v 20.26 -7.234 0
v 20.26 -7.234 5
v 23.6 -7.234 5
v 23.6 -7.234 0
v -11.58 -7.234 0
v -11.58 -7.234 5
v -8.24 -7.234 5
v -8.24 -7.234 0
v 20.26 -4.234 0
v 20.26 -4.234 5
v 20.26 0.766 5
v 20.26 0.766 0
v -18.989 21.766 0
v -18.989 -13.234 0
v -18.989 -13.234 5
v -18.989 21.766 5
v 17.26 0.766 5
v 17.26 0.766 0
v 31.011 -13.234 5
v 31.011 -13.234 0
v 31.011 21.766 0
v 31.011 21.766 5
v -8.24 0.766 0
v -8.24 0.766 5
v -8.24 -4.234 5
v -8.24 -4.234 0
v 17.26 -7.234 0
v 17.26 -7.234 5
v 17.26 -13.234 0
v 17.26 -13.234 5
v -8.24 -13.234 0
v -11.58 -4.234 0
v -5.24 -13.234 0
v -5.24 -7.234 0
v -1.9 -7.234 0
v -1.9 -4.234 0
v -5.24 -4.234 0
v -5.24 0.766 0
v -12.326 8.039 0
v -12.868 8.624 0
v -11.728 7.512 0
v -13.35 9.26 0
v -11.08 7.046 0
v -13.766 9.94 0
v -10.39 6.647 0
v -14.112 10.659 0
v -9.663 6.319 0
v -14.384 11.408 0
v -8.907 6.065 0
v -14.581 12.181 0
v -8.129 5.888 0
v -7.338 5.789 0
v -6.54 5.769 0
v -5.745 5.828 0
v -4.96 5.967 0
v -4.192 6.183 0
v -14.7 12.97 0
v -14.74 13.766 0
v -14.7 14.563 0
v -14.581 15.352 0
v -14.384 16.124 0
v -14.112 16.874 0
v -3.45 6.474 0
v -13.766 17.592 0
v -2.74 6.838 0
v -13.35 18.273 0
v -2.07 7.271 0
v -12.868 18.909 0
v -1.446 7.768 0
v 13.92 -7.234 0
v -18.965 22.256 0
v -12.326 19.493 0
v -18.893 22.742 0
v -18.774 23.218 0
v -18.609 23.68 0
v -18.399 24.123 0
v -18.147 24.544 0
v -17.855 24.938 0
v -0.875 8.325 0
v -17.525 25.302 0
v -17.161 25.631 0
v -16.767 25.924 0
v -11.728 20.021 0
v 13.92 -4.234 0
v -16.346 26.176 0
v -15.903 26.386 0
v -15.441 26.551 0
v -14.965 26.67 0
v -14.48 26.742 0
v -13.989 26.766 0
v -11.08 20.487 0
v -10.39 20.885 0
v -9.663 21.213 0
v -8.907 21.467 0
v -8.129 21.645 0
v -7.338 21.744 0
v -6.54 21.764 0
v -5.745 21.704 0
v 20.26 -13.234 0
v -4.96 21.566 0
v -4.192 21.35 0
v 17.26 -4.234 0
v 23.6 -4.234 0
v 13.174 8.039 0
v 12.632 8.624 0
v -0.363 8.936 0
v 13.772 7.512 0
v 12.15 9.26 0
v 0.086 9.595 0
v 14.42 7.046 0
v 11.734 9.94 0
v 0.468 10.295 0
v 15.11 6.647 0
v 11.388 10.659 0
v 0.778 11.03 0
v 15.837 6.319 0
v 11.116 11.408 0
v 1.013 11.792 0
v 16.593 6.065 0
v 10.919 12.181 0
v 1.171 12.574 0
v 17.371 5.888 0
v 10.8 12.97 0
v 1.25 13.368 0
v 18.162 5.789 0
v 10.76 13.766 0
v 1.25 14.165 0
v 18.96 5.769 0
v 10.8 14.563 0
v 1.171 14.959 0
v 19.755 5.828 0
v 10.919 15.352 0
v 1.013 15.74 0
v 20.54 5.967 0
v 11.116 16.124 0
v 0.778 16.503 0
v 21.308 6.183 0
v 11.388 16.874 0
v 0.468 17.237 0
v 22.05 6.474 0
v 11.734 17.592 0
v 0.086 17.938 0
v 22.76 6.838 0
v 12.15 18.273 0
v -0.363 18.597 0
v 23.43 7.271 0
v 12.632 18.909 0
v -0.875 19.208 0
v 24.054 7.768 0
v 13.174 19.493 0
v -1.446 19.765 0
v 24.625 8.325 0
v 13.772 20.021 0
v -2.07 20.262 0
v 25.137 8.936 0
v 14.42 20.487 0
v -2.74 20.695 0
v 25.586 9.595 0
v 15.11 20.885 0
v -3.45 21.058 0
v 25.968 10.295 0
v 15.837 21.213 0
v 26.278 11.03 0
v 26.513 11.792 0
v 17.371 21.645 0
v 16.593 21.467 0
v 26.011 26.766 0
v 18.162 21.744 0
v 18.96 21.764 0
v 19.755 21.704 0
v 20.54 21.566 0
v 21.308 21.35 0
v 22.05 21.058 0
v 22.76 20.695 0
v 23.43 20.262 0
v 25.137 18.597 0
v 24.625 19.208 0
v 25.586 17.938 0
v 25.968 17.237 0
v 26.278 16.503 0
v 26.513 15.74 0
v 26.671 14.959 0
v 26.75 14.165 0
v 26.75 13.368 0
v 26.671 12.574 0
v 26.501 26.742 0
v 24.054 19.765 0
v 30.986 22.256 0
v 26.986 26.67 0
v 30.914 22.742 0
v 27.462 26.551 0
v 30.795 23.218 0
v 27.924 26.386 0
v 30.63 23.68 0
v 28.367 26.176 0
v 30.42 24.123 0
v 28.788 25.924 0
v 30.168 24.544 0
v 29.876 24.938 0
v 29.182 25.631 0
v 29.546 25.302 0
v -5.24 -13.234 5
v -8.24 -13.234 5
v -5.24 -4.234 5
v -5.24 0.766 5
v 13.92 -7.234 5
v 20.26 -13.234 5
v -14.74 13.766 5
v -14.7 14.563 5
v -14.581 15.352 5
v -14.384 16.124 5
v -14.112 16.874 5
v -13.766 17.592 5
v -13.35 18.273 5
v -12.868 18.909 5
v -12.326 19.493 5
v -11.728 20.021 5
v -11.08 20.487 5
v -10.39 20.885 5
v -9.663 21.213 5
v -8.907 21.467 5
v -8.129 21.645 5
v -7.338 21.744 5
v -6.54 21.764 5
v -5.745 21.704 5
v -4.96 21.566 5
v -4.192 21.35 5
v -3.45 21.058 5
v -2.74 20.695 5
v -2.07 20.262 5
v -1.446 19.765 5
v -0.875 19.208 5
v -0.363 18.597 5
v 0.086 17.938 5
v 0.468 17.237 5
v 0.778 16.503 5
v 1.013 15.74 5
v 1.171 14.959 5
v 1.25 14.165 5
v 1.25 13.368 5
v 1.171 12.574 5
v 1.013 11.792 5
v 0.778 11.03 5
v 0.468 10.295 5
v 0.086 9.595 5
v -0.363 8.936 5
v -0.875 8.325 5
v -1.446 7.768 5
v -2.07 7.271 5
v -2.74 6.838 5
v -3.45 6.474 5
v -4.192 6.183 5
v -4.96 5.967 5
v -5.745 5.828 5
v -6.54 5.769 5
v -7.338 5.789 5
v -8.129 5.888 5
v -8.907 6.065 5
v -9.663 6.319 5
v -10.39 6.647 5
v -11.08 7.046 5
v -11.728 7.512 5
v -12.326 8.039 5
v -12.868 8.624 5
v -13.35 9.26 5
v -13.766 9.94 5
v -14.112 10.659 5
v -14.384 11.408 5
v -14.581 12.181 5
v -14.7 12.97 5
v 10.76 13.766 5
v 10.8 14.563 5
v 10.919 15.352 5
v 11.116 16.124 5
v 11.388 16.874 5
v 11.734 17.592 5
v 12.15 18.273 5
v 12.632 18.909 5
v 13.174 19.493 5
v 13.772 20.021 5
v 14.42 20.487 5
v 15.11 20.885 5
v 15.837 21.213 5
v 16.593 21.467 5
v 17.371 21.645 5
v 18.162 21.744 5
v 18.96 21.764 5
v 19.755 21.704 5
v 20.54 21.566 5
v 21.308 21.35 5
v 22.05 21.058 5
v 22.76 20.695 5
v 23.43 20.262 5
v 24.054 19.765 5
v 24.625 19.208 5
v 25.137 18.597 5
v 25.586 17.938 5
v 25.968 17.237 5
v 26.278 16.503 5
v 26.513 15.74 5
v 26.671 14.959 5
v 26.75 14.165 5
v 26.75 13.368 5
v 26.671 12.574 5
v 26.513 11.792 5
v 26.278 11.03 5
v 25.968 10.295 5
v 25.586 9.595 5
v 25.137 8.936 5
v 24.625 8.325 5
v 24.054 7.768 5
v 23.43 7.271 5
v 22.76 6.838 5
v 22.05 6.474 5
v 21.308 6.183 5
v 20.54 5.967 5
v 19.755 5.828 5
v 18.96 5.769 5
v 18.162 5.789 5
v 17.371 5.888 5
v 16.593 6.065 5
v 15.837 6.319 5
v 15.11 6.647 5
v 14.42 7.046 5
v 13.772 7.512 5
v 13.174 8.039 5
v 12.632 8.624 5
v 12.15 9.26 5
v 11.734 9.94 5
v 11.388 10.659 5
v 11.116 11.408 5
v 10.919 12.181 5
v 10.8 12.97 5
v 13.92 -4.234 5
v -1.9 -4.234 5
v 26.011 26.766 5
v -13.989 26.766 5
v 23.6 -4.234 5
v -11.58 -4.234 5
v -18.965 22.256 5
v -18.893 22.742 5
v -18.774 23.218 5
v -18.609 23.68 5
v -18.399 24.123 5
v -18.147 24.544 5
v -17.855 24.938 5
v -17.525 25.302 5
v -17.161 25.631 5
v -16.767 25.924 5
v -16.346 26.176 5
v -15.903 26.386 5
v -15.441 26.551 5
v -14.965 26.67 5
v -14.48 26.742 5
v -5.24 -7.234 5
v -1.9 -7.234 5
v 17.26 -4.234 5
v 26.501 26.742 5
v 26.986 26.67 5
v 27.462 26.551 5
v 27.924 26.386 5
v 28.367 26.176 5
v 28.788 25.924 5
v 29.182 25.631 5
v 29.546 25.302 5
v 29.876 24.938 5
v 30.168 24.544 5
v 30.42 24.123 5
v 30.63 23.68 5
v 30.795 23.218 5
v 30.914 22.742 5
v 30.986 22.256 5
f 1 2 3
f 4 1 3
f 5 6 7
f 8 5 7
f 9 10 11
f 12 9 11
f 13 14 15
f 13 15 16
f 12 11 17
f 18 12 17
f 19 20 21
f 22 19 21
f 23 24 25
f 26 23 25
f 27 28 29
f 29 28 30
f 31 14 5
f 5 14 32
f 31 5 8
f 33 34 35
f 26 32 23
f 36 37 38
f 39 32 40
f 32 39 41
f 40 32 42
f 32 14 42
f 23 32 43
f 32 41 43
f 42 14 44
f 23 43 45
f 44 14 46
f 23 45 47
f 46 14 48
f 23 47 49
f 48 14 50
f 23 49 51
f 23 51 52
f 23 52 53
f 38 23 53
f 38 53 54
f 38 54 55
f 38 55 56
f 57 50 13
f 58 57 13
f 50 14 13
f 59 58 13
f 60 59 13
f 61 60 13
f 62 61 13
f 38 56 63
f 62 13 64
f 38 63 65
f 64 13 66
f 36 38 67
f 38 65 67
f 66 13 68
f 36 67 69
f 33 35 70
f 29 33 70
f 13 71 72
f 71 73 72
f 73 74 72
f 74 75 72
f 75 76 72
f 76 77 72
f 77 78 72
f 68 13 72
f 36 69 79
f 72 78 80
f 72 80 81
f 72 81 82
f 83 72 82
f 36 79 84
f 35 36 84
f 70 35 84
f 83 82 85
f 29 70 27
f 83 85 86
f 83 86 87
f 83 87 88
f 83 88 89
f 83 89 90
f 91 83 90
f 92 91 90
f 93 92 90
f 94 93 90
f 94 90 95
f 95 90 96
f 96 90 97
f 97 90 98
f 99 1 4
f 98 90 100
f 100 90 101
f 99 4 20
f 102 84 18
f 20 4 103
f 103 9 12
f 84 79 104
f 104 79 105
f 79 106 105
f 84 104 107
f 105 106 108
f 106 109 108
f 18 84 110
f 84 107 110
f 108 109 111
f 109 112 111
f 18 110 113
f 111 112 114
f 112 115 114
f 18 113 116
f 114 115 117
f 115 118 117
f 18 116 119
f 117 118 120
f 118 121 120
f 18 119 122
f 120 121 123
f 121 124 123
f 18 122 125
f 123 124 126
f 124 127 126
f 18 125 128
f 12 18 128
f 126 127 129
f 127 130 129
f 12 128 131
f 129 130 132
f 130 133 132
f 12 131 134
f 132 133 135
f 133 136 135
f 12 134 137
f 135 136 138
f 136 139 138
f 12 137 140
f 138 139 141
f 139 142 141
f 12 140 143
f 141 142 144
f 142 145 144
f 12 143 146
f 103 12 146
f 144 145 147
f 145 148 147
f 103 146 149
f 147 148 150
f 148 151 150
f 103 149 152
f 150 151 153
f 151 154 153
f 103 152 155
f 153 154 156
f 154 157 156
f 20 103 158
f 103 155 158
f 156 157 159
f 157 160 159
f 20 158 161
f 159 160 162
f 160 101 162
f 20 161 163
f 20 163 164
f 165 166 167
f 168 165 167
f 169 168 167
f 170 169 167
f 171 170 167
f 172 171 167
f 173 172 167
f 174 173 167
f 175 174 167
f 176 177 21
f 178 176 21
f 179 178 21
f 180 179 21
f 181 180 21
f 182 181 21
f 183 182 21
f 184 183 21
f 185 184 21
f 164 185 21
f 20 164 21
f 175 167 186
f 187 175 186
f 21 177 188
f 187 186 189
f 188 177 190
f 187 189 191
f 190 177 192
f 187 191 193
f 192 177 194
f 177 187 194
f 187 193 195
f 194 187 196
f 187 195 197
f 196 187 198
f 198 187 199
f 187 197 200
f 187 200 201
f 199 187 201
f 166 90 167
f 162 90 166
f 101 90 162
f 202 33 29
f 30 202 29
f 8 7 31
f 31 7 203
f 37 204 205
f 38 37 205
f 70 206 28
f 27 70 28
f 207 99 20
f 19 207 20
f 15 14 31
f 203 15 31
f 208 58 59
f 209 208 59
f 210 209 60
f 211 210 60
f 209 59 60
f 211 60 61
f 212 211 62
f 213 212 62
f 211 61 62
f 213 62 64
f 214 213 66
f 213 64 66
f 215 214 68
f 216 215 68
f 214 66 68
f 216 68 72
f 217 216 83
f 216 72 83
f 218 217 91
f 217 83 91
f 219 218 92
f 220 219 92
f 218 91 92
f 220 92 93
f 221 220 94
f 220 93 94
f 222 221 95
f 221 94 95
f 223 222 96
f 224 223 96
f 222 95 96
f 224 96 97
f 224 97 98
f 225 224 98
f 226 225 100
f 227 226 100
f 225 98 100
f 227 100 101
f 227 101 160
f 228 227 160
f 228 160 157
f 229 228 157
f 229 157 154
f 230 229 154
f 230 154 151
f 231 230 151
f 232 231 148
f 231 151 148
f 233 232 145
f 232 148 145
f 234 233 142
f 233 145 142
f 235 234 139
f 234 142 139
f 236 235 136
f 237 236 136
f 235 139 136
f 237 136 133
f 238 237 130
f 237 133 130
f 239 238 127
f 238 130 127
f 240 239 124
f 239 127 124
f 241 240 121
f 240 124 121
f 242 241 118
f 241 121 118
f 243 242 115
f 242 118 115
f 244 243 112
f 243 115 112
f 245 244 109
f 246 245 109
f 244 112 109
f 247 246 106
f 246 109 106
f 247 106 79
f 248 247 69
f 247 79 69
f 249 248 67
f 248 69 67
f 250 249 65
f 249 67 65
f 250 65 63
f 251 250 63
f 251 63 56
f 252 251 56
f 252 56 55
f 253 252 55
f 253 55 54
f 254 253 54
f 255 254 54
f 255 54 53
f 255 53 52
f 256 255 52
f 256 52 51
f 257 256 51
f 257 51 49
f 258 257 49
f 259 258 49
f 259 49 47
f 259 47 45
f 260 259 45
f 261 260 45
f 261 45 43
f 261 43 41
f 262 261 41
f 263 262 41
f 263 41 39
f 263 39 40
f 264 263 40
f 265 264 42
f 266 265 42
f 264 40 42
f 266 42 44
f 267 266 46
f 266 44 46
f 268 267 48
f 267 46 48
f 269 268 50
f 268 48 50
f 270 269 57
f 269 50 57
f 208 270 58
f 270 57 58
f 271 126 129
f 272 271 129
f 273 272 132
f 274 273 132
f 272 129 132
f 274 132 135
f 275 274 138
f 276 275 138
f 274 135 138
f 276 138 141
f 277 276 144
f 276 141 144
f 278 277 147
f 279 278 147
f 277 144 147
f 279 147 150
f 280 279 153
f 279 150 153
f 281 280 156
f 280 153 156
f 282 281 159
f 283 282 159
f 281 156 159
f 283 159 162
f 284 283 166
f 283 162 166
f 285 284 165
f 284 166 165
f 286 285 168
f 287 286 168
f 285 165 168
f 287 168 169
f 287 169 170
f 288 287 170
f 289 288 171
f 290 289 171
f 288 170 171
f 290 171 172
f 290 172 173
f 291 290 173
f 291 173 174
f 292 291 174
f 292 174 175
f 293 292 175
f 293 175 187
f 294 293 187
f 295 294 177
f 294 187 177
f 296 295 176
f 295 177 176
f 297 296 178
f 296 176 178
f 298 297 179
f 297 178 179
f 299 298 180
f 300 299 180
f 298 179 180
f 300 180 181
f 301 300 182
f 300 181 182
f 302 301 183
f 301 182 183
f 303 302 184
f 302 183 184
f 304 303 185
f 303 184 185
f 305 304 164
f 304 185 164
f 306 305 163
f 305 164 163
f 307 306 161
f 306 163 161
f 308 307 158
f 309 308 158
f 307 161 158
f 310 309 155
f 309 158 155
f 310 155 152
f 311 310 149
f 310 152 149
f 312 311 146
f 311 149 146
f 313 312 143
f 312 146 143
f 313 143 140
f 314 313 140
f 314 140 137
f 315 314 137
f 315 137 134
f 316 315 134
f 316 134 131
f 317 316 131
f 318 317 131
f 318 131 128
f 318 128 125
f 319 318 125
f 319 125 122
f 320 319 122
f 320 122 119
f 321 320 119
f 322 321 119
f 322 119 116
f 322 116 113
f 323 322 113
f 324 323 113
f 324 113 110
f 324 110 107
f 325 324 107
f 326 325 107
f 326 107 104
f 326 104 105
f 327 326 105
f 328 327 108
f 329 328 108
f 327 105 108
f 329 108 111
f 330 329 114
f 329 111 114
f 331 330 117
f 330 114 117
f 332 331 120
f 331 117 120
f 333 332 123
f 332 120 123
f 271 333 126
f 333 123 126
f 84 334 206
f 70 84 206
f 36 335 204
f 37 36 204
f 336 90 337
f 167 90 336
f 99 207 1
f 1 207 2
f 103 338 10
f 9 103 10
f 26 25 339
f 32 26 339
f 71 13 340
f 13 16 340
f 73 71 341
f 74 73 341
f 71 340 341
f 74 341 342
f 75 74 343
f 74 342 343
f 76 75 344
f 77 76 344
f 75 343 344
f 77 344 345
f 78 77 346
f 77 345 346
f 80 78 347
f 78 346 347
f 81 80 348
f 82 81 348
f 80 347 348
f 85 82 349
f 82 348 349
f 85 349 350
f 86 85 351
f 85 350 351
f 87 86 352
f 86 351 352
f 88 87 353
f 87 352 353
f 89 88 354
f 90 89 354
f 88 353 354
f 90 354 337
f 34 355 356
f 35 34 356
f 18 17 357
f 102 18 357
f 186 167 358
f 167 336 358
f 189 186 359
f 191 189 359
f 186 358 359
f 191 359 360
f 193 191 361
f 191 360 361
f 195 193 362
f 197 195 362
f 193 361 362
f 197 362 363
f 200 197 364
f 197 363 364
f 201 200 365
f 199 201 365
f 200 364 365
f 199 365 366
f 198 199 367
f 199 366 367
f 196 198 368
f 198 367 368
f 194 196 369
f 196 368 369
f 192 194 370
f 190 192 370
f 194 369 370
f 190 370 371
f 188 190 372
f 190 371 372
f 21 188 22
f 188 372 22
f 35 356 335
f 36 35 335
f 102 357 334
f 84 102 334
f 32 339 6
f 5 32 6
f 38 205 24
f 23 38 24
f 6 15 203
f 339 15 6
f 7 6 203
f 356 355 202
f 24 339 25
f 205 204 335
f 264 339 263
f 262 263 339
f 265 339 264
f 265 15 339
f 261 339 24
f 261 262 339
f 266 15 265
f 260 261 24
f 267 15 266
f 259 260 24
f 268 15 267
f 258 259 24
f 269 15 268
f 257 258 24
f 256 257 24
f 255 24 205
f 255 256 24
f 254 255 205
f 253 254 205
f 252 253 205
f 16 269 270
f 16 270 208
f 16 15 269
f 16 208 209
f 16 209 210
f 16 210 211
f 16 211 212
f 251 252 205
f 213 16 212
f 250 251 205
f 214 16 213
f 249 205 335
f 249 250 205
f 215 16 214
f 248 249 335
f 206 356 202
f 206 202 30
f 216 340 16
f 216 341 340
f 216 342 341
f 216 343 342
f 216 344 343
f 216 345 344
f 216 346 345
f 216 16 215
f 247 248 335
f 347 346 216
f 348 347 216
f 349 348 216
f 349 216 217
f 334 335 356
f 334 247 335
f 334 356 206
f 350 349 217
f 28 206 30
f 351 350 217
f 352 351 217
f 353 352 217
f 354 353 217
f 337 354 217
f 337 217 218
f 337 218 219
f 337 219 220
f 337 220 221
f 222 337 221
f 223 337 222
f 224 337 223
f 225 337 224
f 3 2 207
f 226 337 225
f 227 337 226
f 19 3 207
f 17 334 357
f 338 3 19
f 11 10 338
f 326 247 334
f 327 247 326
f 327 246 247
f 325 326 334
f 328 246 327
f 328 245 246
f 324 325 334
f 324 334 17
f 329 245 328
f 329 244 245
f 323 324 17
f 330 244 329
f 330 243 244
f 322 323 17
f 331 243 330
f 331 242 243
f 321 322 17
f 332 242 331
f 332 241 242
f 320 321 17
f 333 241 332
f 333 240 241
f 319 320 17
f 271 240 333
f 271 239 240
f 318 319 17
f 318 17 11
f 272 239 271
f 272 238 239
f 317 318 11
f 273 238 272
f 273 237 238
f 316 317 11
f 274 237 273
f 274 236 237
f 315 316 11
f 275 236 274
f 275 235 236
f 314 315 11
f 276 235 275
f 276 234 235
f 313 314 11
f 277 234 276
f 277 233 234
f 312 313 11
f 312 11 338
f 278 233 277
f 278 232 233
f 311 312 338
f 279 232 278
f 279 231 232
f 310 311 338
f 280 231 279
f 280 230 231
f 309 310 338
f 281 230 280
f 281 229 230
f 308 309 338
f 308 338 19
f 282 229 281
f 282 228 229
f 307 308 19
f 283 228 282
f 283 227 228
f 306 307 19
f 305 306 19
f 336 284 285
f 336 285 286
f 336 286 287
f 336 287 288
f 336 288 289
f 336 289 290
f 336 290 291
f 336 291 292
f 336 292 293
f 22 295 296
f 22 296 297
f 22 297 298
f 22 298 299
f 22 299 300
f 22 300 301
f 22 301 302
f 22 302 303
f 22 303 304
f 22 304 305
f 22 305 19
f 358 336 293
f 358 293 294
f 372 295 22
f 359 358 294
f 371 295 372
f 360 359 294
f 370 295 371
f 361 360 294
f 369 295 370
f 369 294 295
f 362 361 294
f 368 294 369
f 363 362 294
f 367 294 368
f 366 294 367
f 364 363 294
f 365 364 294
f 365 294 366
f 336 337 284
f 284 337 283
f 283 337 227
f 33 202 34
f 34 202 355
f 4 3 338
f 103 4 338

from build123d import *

# Parameters (mm, degrees)
SKETCH1_W           = 50
SKETCH1_H           = 40
BOSS_EXTRUDE1_DEPTH = 5
SKETCH2_R           = 8
CUT_EXTRUDE1_DEPTH  = 5
CUT_EXTRUDE2_DEPTH  = 10
FILLET1_R           = 5
FILLET2_R           = 5


with BuildPart() as part:
    # Sketch1 → Boss-Extrude1 (new body)
    with BuildSketch(Plane.XY):
        with Locations((6.010513563, 6.766366312)):
            Rectangle(SKETCH1_W, SKETCH1_H)
    extrude(amount=BOSS_EXTRUDE1_DEPTH)

    # Sketch2 → Cut-Extrude1 (cut)
    with BuildSketch(Plane(origin=(0, 0, 0), x_dir=(-1, 0, 0), z_dir=(0, 0, -1))):
        with Locations((-18.760103176, 13.766366312)):
            Circle(SKETCH2_R)
        with Locations((6.739896824, 13.766366312)):
            Circle(SKETCH2_R)
    extrude(amount=-CUT_EXTRUDE1_DEPTH, mode=Mode.SUBTRACT)

    # Sketch3 → Cut-Extrude2 (cut)
    with BuildSketch(Plane.XY.offset(5)):
        Polygon((17.260103176, -13.233633688), (20.260103176, -13.233633688), (20.260103176, -7.233633688), (23.600103176, -7.233633688), (23.600103176, -4.233633688), (20.260103176, -4.233633688), (20.260103176, 0.766366312), (17.260103176, 0.766366312), (17.260103176, -4.233633688), (13.920103176, -4.233633688), (13.920103176, -7.233633688), (17.260103176, -7.233633688), align=None)
        Polygon((-8.239896824, -13.233633688), (-5.239896824, -13.233633688), (-5.239896824, -7.233633688), (-1.899896824, -7.233633688), (-1.899896824, -4.233633688), (-5.239896824, -4.233633688), (-5.239896824, 0.766366312), (-8.239896824, 0.766366312), (-8.239896824, -4.233633688), (-11.579896824, -4.233633688), (-11.579896824, -7.233633688), (-8.239896824, -7.233633688), align=None)
    extrude(amount=-CUT_EXTRUDE2_DEPTH, mode=Mode.SUBTRACT)

    # Fillet1
    fillet1_edges = [part.edges().sort_by_distance(p)[0] for p in [
        (-18.989486437, 26.766366312, 2.5),
    ]]
    fillet(fillet1_edges, radius=FILLET1_R)

    # Fillet2
    fillet2_edges = [part.edges().sort_by_distance(p)[0] for p in [
        (31.010513563, 26.766366312, 2.5),
    ]]
    fillet(fillet2_edges, radius=FILLET2_R)


solid = part.part
